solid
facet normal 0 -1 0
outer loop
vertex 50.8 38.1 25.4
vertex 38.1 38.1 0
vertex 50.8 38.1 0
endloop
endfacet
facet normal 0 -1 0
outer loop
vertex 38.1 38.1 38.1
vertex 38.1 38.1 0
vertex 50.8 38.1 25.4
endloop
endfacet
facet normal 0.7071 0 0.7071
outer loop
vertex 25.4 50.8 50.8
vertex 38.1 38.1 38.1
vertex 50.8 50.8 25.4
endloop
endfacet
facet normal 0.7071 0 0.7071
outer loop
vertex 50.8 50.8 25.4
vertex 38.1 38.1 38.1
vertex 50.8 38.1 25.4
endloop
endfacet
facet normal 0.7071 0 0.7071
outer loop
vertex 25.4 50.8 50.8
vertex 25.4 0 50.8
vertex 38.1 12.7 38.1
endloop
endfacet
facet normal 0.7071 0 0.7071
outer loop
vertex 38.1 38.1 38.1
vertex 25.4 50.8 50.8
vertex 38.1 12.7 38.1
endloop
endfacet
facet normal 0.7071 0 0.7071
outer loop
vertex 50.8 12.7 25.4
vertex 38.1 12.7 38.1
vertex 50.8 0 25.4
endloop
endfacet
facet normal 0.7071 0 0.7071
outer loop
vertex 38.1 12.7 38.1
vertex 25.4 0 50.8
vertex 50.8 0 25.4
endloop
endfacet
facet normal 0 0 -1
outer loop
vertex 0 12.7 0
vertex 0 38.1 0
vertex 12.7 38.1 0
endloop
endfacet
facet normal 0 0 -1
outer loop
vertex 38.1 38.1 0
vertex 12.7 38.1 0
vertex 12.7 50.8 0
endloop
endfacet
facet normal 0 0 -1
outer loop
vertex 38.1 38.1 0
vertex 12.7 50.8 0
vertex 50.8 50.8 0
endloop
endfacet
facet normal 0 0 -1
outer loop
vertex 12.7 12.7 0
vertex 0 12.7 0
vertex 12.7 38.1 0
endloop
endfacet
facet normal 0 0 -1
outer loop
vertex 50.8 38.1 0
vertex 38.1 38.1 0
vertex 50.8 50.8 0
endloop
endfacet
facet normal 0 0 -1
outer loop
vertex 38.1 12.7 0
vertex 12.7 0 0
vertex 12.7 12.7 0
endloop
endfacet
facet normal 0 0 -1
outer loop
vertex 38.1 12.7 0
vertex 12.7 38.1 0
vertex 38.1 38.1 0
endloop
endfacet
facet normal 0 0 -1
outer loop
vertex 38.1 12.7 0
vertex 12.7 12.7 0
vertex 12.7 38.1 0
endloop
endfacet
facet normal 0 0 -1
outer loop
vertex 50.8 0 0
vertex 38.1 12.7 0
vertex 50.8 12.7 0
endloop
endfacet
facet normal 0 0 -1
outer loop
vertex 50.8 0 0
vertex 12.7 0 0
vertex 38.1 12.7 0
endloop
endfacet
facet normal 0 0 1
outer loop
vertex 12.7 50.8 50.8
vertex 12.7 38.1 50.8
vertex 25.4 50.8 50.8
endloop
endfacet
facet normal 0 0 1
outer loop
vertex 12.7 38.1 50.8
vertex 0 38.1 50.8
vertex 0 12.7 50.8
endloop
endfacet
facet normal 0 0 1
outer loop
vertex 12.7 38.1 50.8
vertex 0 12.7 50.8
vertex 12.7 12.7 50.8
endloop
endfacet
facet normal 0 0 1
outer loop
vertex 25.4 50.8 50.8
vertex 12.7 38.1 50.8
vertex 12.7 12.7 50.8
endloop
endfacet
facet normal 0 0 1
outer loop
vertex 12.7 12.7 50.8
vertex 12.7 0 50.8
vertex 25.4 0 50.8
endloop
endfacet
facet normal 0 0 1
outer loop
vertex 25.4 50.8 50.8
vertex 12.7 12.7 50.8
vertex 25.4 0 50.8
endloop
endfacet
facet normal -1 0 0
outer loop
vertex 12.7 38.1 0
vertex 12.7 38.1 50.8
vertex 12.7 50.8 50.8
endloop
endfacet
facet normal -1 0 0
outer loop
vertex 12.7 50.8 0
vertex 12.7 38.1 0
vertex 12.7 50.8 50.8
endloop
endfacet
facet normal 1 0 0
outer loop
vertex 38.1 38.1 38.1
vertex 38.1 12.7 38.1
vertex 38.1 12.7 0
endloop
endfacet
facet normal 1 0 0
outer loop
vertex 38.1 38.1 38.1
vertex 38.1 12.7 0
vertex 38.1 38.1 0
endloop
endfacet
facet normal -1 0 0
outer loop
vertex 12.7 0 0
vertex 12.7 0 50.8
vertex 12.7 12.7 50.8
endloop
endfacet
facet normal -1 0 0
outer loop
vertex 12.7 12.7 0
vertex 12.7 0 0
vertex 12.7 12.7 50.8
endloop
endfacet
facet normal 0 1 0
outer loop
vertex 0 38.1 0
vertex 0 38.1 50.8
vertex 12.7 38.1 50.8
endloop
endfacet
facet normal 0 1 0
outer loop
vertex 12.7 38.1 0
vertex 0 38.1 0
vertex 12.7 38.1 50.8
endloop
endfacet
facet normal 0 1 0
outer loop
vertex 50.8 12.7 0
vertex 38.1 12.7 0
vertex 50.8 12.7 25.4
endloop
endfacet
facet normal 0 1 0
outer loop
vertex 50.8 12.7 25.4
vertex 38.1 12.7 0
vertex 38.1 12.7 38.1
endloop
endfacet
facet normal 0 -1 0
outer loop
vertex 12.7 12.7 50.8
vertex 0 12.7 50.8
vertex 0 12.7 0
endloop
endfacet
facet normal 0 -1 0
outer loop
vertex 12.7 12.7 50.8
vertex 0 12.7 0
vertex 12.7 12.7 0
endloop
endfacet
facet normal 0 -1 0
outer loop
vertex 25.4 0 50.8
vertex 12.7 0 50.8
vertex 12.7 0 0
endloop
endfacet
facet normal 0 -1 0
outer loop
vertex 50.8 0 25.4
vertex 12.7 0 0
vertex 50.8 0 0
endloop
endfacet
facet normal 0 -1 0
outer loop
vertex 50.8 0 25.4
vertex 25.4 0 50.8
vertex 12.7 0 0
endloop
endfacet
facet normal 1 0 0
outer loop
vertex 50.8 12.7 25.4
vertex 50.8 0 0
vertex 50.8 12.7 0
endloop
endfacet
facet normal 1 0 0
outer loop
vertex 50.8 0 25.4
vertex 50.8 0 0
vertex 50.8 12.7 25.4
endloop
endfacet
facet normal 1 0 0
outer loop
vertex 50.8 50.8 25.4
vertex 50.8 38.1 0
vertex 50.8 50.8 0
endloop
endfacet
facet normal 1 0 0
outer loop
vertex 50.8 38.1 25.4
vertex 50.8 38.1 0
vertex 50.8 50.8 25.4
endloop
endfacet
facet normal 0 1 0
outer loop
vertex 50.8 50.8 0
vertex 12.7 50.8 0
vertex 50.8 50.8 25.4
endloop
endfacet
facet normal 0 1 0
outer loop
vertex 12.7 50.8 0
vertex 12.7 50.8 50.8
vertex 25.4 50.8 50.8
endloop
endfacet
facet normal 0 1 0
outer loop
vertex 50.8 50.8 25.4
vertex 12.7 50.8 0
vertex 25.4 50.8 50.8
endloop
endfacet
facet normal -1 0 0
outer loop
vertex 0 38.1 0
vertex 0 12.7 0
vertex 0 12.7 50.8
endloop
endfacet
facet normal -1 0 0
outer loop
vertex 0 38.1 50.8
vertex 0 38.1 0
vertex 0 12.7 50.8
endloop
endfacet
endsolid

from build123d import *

# Parameters (mm, degrees)
F0_W     = 50.8
F0_H     = 50.8
F1_DEPTH = 50.8
F2_W     = 12.7
F2_H     = 12.7
F2_H_2   = 25.4
F3_DEPTH = 76.2
F5_DEPTH = 101.6


with BuildPart() as f1:
    # F0 (on Front) → F1 (new body)
    with BuildSketch(Plane.XZ):
        with Locations((25.4, 25.4)):
            Rectangle(F0_W, F0_H)
    extrude(amount=-F1_DEPTH)

    # F2 (on face) → F3 (cut)
    with BuildSketch(Plane.XY.offset(50.8)):
        with Locations((6.35, 44.45)):
            Rectangle(F2_W, F2_H)
        with Locations((6.35, 6.35)):
            Rectangle(F2_W, F2_H)
        with Locations((44.45, 25.4)):
            Rectangle(F2_W, F2_H_2)
    extrude(amount=-F3_DEPTH, mode=Mode.SUBTRACT)

    # F4 (on face) → F5 (cut)
    with BuildSketch(Plane.XZ):
        Polygon((50.8, 50.8), (25.4, 50.8), (50.8, 25.4), align=None)
    extrude(amount=-F5_DEPTH, mode=Mode.SUBTRACT)


solid = f1.part
